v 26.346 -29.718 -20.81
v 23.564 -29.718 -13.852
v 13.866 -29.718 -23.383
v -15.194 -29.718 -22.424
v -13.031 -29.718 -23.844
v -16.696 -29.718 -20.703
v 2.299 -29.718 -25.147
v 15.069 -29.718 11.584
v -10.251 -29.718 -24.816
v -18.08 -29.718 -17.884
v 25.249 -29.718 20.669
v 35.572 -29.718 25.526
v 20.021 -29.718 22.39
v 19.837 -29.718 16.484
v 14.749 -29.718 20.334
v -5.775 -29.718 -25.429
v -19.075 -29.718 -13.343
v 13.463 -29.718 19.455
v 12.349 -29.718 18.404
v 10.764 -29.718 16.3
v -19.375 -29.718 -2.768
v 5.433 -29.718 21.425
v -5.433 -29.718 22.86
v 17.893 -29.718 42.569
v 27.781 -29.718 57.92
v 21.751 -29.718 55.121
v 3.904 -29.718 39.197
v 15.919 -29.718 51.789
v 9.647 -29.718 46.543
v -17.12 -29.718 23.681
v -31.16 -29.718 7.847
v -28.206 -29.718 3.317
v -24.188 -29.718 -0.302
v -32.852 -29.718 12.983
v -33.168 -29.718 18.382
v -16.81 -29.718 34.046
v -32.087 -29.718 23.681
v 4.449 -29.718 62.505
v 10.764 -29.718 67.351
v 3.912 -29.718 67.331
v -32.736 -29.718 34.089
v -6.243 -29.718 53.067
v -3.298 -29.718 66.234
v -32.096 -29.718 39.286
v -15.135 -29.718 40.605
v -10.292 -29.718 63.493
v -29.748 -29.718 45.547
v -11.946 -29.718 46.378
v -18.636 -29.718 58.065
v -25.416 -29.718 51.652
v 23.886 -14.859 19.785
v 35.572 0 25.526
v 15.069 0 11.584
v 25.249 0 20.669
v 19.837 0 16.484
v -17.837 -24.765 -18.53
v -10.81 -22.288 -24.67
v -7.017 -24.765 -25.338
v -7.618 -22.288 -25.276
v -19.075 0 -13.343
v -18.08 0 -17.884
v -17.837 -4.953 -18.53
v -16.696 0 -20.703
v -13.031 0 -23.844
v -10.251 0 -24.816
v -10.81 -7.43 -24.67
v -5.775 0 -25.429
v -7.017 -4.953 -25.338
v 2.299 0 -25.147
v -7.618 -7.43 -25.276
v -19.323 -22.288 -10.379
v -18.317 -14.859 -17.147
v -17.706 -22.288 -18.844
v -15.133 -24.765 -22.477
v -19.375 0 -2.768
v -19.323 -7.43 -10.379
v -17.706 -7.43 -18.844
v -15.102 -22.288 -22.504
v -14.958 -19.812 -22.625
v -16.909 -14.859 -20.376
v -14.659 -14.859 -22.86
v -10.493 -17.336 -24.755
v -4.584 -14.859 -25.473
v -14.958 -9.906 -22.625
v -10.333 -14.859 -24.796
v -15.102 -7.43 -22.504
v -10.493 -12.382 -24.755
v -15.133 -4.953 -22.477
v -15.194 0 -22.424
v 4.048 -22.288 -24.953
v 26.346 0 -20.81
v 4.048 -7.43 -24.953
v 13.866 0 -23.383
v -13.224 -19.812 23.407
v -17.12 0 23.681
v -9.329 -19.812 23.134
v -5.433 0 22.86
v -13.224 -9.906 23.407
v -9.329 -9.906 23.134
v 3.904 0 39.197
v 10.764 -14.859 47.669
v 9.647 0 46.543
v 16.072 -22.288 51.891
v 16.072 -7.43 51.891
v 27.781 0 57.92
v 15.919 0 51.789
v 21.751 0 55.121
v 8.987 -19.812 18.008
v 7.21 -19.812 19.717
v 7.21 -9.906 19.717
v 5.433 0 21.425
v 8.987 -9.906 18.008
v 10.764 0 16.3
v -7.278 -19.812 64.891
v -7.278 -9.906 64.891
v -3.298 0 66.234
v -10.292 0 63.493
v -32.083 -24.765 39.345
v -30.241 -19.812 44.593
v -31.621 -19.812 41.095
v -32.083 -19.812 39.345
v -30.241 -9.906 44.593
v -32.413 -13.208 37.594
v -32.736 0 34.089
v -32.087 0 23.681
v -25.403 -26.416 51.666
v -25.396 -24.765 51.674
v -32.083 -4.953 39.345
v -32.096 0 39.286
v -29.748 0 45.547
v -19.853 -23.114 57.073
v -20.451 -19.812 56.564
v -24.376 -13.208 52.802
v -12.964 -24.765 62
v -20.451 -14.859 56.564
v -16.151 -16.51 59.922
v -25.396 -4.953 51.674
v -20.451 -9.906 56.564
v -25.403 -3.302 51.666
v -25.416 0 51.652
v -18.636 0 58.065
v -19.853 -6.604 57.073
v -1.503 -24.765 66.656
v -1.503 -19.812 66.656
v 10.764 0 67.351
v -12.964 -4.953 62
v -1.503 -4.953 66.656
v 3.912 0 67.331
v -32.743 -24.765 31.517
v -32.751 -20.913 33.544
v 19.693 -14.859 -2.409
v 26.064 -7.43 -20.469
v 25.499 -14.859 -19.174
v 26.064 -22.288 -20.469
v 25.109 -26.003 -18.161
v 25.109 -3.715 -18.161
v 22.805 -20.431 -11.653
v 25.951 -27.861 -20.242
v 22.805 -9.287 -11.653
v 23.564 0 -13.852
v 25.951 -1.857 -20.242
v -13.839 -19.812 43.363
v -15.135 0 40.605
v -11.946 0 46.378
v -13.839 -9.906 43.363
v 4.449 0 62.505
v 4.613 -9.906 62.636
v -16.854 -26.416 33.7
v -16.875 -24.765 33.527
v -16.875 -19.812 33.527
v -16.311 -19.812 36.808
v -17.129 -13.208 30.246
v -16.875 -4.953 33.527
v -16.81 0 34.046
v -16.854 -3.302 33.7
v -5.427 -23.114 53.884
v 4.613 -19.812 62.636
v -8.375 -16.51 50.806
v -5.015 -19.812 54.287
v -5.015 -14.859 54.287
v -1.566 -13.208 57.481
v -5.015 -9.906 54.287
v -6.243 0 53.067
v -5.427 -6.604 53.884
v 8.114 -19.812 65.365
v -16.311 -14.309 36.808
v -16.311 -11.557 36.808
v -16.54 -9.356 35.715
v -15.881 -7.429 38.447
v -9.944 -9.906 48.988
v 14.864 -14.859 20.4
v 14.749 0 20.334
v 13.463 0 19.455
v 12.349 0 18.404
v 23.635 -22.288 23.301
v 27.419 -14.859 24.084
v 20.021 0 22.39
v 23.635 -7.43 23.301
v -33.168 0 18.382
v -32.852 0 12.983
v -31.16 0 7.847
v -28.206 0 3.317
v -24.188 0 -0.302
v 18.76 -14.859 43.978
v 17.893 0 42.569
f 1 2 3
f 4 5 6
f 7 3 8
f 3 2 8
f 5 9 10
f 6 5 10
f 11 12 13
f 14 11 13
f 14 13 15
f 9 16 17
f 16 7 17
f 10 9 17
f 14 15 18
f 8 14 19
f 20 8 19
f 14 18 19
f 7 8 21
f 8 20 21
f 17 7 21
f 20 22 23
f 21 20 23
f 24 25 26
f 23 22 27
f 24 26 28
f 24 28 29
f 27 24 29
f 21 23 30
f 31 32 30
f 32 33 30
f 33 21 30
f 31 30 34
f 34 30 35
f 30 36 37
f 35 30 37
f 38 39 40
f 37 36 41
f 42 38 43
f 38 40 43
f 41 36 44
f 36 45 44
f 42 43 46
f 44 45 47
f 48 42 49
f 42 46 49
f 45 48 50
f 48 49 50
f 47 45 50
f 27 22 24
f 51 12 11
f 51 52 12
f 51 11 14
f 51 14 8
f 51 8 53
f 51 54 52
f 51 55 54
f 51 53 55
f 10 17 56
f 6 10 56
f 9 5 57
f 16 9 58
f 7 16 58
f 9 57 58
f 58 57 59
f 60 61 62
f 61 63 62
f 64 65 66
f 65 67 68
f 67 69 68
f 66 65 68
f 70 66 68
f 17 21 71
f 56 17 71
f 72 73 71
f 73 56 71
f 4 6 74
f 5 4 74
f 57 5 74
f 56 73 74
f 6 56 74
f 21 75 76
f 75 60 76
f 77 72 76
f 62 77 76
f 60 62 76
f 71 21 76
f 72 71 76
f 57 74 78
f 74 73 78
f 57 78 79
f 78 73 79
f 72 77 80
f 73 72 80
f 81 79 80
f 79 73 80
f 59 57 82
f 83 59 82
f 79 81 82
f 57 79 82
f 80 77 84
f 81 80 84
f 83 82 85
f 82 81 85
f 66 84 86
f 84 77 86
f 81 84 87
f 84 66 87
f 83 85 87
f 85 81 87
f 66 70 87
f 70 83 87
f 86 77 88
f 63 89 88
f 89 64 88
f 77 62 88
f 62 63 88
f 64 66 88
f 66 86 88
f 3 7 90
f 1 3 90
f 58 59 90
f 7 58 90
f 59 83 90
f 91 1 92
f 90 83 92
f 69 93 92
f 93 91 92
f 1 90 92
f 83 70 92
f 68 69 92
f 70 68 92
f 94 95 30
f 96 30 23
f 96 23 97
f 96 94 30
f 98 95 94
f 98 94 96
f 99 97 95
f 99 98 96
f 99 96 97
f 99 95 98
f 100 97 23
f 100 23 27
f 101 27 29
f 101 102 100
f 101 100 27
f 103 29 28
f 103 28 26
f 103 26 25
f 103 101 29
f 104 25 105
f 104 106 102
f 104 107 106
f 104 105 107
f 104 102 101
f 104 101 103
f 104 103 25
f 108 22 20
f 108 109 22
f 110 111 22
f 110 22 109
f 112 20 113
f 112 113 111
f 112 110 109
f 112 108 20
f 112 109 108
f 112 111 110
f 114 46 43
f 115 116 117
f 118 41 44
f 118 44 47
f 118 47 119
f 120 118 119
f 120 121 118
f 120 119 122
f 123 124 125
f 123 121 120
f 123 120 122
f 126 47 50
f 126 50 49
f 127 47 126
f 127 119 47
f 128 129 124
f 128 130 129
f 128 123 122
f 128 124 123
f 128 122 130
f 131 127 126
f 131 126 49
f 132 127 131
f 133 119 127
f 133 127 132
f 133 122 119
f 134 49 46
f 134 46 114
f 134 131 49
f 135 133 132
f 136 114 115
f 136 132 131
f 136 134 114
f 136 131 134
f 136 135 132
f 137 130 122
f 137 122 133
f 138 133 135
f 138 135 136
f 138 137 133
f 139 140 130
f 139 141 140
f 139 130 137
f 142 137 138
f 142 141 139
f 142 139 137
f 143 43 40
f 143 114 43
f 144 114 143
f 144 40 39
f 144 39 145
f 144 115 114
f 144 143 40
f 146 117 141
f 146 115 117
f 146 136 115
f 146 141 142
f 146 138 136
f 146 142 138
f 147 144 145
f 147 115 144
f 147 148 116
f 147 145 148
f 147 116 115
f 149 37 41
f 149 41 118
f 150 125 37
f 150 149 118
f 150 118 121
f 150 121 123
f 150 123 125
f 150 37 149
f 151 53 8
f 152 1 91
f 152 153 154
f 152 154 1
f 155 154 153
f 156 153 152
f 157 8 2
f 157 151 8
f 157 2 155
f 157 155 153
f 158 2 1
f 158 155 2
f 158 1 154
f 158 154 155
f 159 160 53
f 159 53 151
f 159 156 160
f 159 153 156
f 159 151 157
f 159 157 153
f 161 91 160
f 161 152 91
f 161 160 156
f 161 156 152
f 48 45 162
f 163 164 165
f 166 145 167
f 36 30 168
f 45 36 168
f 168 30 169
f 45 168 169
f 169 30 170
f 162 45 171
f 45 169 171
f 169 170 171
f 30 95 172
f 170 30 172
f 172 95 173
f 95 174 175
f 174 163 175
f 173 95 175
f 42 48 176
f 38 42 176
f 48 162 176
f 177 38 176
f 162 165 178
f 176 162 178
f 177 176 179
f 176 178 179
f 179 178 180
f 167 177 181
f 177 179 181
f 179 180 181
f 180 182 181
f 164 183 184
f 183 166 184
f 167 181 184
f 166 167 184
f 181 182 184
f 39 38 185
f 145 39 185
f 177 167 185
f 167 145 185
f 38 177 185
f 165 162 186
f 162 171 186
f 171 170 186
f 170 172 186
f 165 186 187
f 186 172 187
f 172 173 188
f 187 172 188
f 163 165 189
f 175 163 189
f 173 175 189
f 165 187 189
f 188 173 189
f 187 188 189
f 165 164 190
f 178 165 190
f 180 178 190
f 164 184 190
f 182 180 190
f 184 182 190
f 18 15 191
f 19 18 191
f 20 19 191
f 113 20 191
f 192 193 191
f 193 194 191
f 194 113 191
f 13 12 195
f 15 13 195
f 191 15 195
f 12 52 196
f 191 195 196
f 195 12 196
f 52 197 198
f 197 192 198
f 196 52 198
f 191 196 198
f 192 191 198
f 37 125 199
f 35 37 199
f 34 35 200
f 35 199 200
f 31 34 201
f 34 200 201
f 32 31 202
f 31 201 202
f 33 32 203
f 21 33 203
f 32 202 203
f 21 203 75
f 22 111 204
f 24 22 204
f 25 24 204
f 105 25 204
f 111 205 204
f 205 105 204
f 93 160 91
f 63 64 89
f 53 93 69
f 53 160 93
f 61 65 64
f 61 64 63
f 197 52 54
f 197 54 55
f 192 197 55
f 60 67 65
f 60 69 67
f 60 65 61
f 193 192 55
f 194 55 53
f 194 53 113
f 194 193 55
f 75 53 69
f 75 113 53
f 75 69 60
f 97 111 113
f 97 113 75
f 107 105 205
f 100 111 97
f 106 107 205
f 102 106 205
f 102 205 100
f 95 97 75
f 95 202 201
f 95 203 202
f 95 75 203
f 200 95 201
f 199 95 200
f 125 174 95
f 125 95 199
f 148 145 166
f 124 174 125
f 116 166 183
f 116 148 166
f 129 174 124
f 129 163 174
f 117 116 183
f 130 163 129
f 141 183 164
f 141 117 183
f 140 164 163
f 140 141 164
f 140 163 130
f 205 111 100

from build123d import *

# Parameters (mm, degrees)
F1_DEPTH = 29.718


with BuildPart() as f1:
    # F0 (on Front) → F1 (new body)
    with BuildSketch(Plane.XZ):
        with BuildLine():
            add(Edge.make_bspline(
                [(-32.0866517723, 23.6805640161), (-32.8666613396, 30.6609452669), (-34.5891090637, 46.0752969657), (-8.0219653397, 67.7935022903), (5.0666127176, 67.4853493372), (10.7638910413, 67.3512145877)],
                knots=[0, 0, 0, 0, 0.318515913, 0.7033593336, 1, 1, 1, 1], degree=3))
            ThreePointArc((-32.0866517723, 23.6805640161), (-31.1602984311, 7.8468410593), (-19.3750075996, -2.7678578626))
            add(Edge.make_bspline(
                [(-19.3750075996, -2.7678578626), (-19.4872973759, -10.9551838639), (-19.7579640402, -30.6901614532), (9.3271529991, -24.4572784772), (26.3459105045, -20.8101924509)],
                knots=[0, 0, 0, 0, 0.4148637091, 1, 1, 1, 1], degree=3))
            add(Edge.make_bspline(
                [(15.0694511831, 11.5839987993), (20.1102911586, -3.7183224507), (25.6163639625, -20.4329365391), (26.2890705063, -20.7807999117), (26.3459105045, -20.8101924509)],
                knots=[0, 0, 0, 0, 0.9155055073, 1, 1, 1, 1], degree=3))
            add(Edge.make_bspline(
                [(35.572104156, 25.5258046091), (31.4625973654, 23.8490473561), (23.401191173, 20.5598396748), (17.8102620302, 14.5366932021), (15.0694511831, 11.5839987993)],
                knots=[0, 0, 0, 0, 0.5097754278, 1, 1, 1, 1], degree=3))
            add(Edge.make_bspline(
                [(35.572104156, 25.5258046091), (27.2626065539, 24.1173148141), (14.6206910634, 21.9744645709), (11.7482754665, 17.7480221093), (10.7638910413, 16.2996090949)],
                knots=[0, 0, 0, 0, 0.6572973541, 1, 1, 1, 1], degree=3))
            add(Edge.make_bspline(
                [(5.4332027212, 21.4252732694), (7.2100988279, 19.7167185446), (8.9869949346, 18.0081638197), (10.7638910413, 16.2996090949)],
                knots=[0, 0, 0, 0, 7.3951789158, 7.3951789158, 7.3951789158, 7.3951789158], degree=3))
            add(Edge.make_bspline(
                [(5.4332027212, 21.4252732694), (10.0606699608, 29.4107665515), (18.3724461644, 43.7541707506), (24.8914551048, 53.5693047614), (27.7810953557, 57.9199977219)],
                knots=[0, 0, 0, 0, 0.5567362651, 1, 1, 1, 1], degree=3))
            add(Edge.make_bspline(
                [(-5.4332041182, 22.8604581207), (-0.4542495949, 32.2559538497), (8.601792123, 49.345083884), (21.8270160093, 55.2579762313), (27.7810953557, 57.9199977219)],
                knots=[0, 0, 0, 0, 0.5497936823, 1, 1, 1, 1], degree=3))
            add(Edge.make_bspline(
                [(-17.1197168529, 23.6805640161), (-13.224212608, 23.4071953843), (-9.3287083631, 23.1338267525), (-5.4332041182, 22.8604581207)],
                knots=[0, 0, 0, 0, 11.7152530309, 11.7152530309, 11.7152530309, 11.7152530309], degree=3))
            add(Edge.make_bspline(
                [(-17.1197168529, 23.6805640161), (-17.2670190845, 30.2464438146), (-17.5846554166, 44.404830652), (4.3167592547, 62.5648139276), (9.0916701904, 66.1097448537), (10.7638910413, 67.3512145877)],
                knots=[0, 0, 0, 0, 0.3597657155, 0.7757836461, 1, 1, 1, 1], degree=3))
        make_face()
    extrude(amount=F1_DEPTH)


solid = f1.part
